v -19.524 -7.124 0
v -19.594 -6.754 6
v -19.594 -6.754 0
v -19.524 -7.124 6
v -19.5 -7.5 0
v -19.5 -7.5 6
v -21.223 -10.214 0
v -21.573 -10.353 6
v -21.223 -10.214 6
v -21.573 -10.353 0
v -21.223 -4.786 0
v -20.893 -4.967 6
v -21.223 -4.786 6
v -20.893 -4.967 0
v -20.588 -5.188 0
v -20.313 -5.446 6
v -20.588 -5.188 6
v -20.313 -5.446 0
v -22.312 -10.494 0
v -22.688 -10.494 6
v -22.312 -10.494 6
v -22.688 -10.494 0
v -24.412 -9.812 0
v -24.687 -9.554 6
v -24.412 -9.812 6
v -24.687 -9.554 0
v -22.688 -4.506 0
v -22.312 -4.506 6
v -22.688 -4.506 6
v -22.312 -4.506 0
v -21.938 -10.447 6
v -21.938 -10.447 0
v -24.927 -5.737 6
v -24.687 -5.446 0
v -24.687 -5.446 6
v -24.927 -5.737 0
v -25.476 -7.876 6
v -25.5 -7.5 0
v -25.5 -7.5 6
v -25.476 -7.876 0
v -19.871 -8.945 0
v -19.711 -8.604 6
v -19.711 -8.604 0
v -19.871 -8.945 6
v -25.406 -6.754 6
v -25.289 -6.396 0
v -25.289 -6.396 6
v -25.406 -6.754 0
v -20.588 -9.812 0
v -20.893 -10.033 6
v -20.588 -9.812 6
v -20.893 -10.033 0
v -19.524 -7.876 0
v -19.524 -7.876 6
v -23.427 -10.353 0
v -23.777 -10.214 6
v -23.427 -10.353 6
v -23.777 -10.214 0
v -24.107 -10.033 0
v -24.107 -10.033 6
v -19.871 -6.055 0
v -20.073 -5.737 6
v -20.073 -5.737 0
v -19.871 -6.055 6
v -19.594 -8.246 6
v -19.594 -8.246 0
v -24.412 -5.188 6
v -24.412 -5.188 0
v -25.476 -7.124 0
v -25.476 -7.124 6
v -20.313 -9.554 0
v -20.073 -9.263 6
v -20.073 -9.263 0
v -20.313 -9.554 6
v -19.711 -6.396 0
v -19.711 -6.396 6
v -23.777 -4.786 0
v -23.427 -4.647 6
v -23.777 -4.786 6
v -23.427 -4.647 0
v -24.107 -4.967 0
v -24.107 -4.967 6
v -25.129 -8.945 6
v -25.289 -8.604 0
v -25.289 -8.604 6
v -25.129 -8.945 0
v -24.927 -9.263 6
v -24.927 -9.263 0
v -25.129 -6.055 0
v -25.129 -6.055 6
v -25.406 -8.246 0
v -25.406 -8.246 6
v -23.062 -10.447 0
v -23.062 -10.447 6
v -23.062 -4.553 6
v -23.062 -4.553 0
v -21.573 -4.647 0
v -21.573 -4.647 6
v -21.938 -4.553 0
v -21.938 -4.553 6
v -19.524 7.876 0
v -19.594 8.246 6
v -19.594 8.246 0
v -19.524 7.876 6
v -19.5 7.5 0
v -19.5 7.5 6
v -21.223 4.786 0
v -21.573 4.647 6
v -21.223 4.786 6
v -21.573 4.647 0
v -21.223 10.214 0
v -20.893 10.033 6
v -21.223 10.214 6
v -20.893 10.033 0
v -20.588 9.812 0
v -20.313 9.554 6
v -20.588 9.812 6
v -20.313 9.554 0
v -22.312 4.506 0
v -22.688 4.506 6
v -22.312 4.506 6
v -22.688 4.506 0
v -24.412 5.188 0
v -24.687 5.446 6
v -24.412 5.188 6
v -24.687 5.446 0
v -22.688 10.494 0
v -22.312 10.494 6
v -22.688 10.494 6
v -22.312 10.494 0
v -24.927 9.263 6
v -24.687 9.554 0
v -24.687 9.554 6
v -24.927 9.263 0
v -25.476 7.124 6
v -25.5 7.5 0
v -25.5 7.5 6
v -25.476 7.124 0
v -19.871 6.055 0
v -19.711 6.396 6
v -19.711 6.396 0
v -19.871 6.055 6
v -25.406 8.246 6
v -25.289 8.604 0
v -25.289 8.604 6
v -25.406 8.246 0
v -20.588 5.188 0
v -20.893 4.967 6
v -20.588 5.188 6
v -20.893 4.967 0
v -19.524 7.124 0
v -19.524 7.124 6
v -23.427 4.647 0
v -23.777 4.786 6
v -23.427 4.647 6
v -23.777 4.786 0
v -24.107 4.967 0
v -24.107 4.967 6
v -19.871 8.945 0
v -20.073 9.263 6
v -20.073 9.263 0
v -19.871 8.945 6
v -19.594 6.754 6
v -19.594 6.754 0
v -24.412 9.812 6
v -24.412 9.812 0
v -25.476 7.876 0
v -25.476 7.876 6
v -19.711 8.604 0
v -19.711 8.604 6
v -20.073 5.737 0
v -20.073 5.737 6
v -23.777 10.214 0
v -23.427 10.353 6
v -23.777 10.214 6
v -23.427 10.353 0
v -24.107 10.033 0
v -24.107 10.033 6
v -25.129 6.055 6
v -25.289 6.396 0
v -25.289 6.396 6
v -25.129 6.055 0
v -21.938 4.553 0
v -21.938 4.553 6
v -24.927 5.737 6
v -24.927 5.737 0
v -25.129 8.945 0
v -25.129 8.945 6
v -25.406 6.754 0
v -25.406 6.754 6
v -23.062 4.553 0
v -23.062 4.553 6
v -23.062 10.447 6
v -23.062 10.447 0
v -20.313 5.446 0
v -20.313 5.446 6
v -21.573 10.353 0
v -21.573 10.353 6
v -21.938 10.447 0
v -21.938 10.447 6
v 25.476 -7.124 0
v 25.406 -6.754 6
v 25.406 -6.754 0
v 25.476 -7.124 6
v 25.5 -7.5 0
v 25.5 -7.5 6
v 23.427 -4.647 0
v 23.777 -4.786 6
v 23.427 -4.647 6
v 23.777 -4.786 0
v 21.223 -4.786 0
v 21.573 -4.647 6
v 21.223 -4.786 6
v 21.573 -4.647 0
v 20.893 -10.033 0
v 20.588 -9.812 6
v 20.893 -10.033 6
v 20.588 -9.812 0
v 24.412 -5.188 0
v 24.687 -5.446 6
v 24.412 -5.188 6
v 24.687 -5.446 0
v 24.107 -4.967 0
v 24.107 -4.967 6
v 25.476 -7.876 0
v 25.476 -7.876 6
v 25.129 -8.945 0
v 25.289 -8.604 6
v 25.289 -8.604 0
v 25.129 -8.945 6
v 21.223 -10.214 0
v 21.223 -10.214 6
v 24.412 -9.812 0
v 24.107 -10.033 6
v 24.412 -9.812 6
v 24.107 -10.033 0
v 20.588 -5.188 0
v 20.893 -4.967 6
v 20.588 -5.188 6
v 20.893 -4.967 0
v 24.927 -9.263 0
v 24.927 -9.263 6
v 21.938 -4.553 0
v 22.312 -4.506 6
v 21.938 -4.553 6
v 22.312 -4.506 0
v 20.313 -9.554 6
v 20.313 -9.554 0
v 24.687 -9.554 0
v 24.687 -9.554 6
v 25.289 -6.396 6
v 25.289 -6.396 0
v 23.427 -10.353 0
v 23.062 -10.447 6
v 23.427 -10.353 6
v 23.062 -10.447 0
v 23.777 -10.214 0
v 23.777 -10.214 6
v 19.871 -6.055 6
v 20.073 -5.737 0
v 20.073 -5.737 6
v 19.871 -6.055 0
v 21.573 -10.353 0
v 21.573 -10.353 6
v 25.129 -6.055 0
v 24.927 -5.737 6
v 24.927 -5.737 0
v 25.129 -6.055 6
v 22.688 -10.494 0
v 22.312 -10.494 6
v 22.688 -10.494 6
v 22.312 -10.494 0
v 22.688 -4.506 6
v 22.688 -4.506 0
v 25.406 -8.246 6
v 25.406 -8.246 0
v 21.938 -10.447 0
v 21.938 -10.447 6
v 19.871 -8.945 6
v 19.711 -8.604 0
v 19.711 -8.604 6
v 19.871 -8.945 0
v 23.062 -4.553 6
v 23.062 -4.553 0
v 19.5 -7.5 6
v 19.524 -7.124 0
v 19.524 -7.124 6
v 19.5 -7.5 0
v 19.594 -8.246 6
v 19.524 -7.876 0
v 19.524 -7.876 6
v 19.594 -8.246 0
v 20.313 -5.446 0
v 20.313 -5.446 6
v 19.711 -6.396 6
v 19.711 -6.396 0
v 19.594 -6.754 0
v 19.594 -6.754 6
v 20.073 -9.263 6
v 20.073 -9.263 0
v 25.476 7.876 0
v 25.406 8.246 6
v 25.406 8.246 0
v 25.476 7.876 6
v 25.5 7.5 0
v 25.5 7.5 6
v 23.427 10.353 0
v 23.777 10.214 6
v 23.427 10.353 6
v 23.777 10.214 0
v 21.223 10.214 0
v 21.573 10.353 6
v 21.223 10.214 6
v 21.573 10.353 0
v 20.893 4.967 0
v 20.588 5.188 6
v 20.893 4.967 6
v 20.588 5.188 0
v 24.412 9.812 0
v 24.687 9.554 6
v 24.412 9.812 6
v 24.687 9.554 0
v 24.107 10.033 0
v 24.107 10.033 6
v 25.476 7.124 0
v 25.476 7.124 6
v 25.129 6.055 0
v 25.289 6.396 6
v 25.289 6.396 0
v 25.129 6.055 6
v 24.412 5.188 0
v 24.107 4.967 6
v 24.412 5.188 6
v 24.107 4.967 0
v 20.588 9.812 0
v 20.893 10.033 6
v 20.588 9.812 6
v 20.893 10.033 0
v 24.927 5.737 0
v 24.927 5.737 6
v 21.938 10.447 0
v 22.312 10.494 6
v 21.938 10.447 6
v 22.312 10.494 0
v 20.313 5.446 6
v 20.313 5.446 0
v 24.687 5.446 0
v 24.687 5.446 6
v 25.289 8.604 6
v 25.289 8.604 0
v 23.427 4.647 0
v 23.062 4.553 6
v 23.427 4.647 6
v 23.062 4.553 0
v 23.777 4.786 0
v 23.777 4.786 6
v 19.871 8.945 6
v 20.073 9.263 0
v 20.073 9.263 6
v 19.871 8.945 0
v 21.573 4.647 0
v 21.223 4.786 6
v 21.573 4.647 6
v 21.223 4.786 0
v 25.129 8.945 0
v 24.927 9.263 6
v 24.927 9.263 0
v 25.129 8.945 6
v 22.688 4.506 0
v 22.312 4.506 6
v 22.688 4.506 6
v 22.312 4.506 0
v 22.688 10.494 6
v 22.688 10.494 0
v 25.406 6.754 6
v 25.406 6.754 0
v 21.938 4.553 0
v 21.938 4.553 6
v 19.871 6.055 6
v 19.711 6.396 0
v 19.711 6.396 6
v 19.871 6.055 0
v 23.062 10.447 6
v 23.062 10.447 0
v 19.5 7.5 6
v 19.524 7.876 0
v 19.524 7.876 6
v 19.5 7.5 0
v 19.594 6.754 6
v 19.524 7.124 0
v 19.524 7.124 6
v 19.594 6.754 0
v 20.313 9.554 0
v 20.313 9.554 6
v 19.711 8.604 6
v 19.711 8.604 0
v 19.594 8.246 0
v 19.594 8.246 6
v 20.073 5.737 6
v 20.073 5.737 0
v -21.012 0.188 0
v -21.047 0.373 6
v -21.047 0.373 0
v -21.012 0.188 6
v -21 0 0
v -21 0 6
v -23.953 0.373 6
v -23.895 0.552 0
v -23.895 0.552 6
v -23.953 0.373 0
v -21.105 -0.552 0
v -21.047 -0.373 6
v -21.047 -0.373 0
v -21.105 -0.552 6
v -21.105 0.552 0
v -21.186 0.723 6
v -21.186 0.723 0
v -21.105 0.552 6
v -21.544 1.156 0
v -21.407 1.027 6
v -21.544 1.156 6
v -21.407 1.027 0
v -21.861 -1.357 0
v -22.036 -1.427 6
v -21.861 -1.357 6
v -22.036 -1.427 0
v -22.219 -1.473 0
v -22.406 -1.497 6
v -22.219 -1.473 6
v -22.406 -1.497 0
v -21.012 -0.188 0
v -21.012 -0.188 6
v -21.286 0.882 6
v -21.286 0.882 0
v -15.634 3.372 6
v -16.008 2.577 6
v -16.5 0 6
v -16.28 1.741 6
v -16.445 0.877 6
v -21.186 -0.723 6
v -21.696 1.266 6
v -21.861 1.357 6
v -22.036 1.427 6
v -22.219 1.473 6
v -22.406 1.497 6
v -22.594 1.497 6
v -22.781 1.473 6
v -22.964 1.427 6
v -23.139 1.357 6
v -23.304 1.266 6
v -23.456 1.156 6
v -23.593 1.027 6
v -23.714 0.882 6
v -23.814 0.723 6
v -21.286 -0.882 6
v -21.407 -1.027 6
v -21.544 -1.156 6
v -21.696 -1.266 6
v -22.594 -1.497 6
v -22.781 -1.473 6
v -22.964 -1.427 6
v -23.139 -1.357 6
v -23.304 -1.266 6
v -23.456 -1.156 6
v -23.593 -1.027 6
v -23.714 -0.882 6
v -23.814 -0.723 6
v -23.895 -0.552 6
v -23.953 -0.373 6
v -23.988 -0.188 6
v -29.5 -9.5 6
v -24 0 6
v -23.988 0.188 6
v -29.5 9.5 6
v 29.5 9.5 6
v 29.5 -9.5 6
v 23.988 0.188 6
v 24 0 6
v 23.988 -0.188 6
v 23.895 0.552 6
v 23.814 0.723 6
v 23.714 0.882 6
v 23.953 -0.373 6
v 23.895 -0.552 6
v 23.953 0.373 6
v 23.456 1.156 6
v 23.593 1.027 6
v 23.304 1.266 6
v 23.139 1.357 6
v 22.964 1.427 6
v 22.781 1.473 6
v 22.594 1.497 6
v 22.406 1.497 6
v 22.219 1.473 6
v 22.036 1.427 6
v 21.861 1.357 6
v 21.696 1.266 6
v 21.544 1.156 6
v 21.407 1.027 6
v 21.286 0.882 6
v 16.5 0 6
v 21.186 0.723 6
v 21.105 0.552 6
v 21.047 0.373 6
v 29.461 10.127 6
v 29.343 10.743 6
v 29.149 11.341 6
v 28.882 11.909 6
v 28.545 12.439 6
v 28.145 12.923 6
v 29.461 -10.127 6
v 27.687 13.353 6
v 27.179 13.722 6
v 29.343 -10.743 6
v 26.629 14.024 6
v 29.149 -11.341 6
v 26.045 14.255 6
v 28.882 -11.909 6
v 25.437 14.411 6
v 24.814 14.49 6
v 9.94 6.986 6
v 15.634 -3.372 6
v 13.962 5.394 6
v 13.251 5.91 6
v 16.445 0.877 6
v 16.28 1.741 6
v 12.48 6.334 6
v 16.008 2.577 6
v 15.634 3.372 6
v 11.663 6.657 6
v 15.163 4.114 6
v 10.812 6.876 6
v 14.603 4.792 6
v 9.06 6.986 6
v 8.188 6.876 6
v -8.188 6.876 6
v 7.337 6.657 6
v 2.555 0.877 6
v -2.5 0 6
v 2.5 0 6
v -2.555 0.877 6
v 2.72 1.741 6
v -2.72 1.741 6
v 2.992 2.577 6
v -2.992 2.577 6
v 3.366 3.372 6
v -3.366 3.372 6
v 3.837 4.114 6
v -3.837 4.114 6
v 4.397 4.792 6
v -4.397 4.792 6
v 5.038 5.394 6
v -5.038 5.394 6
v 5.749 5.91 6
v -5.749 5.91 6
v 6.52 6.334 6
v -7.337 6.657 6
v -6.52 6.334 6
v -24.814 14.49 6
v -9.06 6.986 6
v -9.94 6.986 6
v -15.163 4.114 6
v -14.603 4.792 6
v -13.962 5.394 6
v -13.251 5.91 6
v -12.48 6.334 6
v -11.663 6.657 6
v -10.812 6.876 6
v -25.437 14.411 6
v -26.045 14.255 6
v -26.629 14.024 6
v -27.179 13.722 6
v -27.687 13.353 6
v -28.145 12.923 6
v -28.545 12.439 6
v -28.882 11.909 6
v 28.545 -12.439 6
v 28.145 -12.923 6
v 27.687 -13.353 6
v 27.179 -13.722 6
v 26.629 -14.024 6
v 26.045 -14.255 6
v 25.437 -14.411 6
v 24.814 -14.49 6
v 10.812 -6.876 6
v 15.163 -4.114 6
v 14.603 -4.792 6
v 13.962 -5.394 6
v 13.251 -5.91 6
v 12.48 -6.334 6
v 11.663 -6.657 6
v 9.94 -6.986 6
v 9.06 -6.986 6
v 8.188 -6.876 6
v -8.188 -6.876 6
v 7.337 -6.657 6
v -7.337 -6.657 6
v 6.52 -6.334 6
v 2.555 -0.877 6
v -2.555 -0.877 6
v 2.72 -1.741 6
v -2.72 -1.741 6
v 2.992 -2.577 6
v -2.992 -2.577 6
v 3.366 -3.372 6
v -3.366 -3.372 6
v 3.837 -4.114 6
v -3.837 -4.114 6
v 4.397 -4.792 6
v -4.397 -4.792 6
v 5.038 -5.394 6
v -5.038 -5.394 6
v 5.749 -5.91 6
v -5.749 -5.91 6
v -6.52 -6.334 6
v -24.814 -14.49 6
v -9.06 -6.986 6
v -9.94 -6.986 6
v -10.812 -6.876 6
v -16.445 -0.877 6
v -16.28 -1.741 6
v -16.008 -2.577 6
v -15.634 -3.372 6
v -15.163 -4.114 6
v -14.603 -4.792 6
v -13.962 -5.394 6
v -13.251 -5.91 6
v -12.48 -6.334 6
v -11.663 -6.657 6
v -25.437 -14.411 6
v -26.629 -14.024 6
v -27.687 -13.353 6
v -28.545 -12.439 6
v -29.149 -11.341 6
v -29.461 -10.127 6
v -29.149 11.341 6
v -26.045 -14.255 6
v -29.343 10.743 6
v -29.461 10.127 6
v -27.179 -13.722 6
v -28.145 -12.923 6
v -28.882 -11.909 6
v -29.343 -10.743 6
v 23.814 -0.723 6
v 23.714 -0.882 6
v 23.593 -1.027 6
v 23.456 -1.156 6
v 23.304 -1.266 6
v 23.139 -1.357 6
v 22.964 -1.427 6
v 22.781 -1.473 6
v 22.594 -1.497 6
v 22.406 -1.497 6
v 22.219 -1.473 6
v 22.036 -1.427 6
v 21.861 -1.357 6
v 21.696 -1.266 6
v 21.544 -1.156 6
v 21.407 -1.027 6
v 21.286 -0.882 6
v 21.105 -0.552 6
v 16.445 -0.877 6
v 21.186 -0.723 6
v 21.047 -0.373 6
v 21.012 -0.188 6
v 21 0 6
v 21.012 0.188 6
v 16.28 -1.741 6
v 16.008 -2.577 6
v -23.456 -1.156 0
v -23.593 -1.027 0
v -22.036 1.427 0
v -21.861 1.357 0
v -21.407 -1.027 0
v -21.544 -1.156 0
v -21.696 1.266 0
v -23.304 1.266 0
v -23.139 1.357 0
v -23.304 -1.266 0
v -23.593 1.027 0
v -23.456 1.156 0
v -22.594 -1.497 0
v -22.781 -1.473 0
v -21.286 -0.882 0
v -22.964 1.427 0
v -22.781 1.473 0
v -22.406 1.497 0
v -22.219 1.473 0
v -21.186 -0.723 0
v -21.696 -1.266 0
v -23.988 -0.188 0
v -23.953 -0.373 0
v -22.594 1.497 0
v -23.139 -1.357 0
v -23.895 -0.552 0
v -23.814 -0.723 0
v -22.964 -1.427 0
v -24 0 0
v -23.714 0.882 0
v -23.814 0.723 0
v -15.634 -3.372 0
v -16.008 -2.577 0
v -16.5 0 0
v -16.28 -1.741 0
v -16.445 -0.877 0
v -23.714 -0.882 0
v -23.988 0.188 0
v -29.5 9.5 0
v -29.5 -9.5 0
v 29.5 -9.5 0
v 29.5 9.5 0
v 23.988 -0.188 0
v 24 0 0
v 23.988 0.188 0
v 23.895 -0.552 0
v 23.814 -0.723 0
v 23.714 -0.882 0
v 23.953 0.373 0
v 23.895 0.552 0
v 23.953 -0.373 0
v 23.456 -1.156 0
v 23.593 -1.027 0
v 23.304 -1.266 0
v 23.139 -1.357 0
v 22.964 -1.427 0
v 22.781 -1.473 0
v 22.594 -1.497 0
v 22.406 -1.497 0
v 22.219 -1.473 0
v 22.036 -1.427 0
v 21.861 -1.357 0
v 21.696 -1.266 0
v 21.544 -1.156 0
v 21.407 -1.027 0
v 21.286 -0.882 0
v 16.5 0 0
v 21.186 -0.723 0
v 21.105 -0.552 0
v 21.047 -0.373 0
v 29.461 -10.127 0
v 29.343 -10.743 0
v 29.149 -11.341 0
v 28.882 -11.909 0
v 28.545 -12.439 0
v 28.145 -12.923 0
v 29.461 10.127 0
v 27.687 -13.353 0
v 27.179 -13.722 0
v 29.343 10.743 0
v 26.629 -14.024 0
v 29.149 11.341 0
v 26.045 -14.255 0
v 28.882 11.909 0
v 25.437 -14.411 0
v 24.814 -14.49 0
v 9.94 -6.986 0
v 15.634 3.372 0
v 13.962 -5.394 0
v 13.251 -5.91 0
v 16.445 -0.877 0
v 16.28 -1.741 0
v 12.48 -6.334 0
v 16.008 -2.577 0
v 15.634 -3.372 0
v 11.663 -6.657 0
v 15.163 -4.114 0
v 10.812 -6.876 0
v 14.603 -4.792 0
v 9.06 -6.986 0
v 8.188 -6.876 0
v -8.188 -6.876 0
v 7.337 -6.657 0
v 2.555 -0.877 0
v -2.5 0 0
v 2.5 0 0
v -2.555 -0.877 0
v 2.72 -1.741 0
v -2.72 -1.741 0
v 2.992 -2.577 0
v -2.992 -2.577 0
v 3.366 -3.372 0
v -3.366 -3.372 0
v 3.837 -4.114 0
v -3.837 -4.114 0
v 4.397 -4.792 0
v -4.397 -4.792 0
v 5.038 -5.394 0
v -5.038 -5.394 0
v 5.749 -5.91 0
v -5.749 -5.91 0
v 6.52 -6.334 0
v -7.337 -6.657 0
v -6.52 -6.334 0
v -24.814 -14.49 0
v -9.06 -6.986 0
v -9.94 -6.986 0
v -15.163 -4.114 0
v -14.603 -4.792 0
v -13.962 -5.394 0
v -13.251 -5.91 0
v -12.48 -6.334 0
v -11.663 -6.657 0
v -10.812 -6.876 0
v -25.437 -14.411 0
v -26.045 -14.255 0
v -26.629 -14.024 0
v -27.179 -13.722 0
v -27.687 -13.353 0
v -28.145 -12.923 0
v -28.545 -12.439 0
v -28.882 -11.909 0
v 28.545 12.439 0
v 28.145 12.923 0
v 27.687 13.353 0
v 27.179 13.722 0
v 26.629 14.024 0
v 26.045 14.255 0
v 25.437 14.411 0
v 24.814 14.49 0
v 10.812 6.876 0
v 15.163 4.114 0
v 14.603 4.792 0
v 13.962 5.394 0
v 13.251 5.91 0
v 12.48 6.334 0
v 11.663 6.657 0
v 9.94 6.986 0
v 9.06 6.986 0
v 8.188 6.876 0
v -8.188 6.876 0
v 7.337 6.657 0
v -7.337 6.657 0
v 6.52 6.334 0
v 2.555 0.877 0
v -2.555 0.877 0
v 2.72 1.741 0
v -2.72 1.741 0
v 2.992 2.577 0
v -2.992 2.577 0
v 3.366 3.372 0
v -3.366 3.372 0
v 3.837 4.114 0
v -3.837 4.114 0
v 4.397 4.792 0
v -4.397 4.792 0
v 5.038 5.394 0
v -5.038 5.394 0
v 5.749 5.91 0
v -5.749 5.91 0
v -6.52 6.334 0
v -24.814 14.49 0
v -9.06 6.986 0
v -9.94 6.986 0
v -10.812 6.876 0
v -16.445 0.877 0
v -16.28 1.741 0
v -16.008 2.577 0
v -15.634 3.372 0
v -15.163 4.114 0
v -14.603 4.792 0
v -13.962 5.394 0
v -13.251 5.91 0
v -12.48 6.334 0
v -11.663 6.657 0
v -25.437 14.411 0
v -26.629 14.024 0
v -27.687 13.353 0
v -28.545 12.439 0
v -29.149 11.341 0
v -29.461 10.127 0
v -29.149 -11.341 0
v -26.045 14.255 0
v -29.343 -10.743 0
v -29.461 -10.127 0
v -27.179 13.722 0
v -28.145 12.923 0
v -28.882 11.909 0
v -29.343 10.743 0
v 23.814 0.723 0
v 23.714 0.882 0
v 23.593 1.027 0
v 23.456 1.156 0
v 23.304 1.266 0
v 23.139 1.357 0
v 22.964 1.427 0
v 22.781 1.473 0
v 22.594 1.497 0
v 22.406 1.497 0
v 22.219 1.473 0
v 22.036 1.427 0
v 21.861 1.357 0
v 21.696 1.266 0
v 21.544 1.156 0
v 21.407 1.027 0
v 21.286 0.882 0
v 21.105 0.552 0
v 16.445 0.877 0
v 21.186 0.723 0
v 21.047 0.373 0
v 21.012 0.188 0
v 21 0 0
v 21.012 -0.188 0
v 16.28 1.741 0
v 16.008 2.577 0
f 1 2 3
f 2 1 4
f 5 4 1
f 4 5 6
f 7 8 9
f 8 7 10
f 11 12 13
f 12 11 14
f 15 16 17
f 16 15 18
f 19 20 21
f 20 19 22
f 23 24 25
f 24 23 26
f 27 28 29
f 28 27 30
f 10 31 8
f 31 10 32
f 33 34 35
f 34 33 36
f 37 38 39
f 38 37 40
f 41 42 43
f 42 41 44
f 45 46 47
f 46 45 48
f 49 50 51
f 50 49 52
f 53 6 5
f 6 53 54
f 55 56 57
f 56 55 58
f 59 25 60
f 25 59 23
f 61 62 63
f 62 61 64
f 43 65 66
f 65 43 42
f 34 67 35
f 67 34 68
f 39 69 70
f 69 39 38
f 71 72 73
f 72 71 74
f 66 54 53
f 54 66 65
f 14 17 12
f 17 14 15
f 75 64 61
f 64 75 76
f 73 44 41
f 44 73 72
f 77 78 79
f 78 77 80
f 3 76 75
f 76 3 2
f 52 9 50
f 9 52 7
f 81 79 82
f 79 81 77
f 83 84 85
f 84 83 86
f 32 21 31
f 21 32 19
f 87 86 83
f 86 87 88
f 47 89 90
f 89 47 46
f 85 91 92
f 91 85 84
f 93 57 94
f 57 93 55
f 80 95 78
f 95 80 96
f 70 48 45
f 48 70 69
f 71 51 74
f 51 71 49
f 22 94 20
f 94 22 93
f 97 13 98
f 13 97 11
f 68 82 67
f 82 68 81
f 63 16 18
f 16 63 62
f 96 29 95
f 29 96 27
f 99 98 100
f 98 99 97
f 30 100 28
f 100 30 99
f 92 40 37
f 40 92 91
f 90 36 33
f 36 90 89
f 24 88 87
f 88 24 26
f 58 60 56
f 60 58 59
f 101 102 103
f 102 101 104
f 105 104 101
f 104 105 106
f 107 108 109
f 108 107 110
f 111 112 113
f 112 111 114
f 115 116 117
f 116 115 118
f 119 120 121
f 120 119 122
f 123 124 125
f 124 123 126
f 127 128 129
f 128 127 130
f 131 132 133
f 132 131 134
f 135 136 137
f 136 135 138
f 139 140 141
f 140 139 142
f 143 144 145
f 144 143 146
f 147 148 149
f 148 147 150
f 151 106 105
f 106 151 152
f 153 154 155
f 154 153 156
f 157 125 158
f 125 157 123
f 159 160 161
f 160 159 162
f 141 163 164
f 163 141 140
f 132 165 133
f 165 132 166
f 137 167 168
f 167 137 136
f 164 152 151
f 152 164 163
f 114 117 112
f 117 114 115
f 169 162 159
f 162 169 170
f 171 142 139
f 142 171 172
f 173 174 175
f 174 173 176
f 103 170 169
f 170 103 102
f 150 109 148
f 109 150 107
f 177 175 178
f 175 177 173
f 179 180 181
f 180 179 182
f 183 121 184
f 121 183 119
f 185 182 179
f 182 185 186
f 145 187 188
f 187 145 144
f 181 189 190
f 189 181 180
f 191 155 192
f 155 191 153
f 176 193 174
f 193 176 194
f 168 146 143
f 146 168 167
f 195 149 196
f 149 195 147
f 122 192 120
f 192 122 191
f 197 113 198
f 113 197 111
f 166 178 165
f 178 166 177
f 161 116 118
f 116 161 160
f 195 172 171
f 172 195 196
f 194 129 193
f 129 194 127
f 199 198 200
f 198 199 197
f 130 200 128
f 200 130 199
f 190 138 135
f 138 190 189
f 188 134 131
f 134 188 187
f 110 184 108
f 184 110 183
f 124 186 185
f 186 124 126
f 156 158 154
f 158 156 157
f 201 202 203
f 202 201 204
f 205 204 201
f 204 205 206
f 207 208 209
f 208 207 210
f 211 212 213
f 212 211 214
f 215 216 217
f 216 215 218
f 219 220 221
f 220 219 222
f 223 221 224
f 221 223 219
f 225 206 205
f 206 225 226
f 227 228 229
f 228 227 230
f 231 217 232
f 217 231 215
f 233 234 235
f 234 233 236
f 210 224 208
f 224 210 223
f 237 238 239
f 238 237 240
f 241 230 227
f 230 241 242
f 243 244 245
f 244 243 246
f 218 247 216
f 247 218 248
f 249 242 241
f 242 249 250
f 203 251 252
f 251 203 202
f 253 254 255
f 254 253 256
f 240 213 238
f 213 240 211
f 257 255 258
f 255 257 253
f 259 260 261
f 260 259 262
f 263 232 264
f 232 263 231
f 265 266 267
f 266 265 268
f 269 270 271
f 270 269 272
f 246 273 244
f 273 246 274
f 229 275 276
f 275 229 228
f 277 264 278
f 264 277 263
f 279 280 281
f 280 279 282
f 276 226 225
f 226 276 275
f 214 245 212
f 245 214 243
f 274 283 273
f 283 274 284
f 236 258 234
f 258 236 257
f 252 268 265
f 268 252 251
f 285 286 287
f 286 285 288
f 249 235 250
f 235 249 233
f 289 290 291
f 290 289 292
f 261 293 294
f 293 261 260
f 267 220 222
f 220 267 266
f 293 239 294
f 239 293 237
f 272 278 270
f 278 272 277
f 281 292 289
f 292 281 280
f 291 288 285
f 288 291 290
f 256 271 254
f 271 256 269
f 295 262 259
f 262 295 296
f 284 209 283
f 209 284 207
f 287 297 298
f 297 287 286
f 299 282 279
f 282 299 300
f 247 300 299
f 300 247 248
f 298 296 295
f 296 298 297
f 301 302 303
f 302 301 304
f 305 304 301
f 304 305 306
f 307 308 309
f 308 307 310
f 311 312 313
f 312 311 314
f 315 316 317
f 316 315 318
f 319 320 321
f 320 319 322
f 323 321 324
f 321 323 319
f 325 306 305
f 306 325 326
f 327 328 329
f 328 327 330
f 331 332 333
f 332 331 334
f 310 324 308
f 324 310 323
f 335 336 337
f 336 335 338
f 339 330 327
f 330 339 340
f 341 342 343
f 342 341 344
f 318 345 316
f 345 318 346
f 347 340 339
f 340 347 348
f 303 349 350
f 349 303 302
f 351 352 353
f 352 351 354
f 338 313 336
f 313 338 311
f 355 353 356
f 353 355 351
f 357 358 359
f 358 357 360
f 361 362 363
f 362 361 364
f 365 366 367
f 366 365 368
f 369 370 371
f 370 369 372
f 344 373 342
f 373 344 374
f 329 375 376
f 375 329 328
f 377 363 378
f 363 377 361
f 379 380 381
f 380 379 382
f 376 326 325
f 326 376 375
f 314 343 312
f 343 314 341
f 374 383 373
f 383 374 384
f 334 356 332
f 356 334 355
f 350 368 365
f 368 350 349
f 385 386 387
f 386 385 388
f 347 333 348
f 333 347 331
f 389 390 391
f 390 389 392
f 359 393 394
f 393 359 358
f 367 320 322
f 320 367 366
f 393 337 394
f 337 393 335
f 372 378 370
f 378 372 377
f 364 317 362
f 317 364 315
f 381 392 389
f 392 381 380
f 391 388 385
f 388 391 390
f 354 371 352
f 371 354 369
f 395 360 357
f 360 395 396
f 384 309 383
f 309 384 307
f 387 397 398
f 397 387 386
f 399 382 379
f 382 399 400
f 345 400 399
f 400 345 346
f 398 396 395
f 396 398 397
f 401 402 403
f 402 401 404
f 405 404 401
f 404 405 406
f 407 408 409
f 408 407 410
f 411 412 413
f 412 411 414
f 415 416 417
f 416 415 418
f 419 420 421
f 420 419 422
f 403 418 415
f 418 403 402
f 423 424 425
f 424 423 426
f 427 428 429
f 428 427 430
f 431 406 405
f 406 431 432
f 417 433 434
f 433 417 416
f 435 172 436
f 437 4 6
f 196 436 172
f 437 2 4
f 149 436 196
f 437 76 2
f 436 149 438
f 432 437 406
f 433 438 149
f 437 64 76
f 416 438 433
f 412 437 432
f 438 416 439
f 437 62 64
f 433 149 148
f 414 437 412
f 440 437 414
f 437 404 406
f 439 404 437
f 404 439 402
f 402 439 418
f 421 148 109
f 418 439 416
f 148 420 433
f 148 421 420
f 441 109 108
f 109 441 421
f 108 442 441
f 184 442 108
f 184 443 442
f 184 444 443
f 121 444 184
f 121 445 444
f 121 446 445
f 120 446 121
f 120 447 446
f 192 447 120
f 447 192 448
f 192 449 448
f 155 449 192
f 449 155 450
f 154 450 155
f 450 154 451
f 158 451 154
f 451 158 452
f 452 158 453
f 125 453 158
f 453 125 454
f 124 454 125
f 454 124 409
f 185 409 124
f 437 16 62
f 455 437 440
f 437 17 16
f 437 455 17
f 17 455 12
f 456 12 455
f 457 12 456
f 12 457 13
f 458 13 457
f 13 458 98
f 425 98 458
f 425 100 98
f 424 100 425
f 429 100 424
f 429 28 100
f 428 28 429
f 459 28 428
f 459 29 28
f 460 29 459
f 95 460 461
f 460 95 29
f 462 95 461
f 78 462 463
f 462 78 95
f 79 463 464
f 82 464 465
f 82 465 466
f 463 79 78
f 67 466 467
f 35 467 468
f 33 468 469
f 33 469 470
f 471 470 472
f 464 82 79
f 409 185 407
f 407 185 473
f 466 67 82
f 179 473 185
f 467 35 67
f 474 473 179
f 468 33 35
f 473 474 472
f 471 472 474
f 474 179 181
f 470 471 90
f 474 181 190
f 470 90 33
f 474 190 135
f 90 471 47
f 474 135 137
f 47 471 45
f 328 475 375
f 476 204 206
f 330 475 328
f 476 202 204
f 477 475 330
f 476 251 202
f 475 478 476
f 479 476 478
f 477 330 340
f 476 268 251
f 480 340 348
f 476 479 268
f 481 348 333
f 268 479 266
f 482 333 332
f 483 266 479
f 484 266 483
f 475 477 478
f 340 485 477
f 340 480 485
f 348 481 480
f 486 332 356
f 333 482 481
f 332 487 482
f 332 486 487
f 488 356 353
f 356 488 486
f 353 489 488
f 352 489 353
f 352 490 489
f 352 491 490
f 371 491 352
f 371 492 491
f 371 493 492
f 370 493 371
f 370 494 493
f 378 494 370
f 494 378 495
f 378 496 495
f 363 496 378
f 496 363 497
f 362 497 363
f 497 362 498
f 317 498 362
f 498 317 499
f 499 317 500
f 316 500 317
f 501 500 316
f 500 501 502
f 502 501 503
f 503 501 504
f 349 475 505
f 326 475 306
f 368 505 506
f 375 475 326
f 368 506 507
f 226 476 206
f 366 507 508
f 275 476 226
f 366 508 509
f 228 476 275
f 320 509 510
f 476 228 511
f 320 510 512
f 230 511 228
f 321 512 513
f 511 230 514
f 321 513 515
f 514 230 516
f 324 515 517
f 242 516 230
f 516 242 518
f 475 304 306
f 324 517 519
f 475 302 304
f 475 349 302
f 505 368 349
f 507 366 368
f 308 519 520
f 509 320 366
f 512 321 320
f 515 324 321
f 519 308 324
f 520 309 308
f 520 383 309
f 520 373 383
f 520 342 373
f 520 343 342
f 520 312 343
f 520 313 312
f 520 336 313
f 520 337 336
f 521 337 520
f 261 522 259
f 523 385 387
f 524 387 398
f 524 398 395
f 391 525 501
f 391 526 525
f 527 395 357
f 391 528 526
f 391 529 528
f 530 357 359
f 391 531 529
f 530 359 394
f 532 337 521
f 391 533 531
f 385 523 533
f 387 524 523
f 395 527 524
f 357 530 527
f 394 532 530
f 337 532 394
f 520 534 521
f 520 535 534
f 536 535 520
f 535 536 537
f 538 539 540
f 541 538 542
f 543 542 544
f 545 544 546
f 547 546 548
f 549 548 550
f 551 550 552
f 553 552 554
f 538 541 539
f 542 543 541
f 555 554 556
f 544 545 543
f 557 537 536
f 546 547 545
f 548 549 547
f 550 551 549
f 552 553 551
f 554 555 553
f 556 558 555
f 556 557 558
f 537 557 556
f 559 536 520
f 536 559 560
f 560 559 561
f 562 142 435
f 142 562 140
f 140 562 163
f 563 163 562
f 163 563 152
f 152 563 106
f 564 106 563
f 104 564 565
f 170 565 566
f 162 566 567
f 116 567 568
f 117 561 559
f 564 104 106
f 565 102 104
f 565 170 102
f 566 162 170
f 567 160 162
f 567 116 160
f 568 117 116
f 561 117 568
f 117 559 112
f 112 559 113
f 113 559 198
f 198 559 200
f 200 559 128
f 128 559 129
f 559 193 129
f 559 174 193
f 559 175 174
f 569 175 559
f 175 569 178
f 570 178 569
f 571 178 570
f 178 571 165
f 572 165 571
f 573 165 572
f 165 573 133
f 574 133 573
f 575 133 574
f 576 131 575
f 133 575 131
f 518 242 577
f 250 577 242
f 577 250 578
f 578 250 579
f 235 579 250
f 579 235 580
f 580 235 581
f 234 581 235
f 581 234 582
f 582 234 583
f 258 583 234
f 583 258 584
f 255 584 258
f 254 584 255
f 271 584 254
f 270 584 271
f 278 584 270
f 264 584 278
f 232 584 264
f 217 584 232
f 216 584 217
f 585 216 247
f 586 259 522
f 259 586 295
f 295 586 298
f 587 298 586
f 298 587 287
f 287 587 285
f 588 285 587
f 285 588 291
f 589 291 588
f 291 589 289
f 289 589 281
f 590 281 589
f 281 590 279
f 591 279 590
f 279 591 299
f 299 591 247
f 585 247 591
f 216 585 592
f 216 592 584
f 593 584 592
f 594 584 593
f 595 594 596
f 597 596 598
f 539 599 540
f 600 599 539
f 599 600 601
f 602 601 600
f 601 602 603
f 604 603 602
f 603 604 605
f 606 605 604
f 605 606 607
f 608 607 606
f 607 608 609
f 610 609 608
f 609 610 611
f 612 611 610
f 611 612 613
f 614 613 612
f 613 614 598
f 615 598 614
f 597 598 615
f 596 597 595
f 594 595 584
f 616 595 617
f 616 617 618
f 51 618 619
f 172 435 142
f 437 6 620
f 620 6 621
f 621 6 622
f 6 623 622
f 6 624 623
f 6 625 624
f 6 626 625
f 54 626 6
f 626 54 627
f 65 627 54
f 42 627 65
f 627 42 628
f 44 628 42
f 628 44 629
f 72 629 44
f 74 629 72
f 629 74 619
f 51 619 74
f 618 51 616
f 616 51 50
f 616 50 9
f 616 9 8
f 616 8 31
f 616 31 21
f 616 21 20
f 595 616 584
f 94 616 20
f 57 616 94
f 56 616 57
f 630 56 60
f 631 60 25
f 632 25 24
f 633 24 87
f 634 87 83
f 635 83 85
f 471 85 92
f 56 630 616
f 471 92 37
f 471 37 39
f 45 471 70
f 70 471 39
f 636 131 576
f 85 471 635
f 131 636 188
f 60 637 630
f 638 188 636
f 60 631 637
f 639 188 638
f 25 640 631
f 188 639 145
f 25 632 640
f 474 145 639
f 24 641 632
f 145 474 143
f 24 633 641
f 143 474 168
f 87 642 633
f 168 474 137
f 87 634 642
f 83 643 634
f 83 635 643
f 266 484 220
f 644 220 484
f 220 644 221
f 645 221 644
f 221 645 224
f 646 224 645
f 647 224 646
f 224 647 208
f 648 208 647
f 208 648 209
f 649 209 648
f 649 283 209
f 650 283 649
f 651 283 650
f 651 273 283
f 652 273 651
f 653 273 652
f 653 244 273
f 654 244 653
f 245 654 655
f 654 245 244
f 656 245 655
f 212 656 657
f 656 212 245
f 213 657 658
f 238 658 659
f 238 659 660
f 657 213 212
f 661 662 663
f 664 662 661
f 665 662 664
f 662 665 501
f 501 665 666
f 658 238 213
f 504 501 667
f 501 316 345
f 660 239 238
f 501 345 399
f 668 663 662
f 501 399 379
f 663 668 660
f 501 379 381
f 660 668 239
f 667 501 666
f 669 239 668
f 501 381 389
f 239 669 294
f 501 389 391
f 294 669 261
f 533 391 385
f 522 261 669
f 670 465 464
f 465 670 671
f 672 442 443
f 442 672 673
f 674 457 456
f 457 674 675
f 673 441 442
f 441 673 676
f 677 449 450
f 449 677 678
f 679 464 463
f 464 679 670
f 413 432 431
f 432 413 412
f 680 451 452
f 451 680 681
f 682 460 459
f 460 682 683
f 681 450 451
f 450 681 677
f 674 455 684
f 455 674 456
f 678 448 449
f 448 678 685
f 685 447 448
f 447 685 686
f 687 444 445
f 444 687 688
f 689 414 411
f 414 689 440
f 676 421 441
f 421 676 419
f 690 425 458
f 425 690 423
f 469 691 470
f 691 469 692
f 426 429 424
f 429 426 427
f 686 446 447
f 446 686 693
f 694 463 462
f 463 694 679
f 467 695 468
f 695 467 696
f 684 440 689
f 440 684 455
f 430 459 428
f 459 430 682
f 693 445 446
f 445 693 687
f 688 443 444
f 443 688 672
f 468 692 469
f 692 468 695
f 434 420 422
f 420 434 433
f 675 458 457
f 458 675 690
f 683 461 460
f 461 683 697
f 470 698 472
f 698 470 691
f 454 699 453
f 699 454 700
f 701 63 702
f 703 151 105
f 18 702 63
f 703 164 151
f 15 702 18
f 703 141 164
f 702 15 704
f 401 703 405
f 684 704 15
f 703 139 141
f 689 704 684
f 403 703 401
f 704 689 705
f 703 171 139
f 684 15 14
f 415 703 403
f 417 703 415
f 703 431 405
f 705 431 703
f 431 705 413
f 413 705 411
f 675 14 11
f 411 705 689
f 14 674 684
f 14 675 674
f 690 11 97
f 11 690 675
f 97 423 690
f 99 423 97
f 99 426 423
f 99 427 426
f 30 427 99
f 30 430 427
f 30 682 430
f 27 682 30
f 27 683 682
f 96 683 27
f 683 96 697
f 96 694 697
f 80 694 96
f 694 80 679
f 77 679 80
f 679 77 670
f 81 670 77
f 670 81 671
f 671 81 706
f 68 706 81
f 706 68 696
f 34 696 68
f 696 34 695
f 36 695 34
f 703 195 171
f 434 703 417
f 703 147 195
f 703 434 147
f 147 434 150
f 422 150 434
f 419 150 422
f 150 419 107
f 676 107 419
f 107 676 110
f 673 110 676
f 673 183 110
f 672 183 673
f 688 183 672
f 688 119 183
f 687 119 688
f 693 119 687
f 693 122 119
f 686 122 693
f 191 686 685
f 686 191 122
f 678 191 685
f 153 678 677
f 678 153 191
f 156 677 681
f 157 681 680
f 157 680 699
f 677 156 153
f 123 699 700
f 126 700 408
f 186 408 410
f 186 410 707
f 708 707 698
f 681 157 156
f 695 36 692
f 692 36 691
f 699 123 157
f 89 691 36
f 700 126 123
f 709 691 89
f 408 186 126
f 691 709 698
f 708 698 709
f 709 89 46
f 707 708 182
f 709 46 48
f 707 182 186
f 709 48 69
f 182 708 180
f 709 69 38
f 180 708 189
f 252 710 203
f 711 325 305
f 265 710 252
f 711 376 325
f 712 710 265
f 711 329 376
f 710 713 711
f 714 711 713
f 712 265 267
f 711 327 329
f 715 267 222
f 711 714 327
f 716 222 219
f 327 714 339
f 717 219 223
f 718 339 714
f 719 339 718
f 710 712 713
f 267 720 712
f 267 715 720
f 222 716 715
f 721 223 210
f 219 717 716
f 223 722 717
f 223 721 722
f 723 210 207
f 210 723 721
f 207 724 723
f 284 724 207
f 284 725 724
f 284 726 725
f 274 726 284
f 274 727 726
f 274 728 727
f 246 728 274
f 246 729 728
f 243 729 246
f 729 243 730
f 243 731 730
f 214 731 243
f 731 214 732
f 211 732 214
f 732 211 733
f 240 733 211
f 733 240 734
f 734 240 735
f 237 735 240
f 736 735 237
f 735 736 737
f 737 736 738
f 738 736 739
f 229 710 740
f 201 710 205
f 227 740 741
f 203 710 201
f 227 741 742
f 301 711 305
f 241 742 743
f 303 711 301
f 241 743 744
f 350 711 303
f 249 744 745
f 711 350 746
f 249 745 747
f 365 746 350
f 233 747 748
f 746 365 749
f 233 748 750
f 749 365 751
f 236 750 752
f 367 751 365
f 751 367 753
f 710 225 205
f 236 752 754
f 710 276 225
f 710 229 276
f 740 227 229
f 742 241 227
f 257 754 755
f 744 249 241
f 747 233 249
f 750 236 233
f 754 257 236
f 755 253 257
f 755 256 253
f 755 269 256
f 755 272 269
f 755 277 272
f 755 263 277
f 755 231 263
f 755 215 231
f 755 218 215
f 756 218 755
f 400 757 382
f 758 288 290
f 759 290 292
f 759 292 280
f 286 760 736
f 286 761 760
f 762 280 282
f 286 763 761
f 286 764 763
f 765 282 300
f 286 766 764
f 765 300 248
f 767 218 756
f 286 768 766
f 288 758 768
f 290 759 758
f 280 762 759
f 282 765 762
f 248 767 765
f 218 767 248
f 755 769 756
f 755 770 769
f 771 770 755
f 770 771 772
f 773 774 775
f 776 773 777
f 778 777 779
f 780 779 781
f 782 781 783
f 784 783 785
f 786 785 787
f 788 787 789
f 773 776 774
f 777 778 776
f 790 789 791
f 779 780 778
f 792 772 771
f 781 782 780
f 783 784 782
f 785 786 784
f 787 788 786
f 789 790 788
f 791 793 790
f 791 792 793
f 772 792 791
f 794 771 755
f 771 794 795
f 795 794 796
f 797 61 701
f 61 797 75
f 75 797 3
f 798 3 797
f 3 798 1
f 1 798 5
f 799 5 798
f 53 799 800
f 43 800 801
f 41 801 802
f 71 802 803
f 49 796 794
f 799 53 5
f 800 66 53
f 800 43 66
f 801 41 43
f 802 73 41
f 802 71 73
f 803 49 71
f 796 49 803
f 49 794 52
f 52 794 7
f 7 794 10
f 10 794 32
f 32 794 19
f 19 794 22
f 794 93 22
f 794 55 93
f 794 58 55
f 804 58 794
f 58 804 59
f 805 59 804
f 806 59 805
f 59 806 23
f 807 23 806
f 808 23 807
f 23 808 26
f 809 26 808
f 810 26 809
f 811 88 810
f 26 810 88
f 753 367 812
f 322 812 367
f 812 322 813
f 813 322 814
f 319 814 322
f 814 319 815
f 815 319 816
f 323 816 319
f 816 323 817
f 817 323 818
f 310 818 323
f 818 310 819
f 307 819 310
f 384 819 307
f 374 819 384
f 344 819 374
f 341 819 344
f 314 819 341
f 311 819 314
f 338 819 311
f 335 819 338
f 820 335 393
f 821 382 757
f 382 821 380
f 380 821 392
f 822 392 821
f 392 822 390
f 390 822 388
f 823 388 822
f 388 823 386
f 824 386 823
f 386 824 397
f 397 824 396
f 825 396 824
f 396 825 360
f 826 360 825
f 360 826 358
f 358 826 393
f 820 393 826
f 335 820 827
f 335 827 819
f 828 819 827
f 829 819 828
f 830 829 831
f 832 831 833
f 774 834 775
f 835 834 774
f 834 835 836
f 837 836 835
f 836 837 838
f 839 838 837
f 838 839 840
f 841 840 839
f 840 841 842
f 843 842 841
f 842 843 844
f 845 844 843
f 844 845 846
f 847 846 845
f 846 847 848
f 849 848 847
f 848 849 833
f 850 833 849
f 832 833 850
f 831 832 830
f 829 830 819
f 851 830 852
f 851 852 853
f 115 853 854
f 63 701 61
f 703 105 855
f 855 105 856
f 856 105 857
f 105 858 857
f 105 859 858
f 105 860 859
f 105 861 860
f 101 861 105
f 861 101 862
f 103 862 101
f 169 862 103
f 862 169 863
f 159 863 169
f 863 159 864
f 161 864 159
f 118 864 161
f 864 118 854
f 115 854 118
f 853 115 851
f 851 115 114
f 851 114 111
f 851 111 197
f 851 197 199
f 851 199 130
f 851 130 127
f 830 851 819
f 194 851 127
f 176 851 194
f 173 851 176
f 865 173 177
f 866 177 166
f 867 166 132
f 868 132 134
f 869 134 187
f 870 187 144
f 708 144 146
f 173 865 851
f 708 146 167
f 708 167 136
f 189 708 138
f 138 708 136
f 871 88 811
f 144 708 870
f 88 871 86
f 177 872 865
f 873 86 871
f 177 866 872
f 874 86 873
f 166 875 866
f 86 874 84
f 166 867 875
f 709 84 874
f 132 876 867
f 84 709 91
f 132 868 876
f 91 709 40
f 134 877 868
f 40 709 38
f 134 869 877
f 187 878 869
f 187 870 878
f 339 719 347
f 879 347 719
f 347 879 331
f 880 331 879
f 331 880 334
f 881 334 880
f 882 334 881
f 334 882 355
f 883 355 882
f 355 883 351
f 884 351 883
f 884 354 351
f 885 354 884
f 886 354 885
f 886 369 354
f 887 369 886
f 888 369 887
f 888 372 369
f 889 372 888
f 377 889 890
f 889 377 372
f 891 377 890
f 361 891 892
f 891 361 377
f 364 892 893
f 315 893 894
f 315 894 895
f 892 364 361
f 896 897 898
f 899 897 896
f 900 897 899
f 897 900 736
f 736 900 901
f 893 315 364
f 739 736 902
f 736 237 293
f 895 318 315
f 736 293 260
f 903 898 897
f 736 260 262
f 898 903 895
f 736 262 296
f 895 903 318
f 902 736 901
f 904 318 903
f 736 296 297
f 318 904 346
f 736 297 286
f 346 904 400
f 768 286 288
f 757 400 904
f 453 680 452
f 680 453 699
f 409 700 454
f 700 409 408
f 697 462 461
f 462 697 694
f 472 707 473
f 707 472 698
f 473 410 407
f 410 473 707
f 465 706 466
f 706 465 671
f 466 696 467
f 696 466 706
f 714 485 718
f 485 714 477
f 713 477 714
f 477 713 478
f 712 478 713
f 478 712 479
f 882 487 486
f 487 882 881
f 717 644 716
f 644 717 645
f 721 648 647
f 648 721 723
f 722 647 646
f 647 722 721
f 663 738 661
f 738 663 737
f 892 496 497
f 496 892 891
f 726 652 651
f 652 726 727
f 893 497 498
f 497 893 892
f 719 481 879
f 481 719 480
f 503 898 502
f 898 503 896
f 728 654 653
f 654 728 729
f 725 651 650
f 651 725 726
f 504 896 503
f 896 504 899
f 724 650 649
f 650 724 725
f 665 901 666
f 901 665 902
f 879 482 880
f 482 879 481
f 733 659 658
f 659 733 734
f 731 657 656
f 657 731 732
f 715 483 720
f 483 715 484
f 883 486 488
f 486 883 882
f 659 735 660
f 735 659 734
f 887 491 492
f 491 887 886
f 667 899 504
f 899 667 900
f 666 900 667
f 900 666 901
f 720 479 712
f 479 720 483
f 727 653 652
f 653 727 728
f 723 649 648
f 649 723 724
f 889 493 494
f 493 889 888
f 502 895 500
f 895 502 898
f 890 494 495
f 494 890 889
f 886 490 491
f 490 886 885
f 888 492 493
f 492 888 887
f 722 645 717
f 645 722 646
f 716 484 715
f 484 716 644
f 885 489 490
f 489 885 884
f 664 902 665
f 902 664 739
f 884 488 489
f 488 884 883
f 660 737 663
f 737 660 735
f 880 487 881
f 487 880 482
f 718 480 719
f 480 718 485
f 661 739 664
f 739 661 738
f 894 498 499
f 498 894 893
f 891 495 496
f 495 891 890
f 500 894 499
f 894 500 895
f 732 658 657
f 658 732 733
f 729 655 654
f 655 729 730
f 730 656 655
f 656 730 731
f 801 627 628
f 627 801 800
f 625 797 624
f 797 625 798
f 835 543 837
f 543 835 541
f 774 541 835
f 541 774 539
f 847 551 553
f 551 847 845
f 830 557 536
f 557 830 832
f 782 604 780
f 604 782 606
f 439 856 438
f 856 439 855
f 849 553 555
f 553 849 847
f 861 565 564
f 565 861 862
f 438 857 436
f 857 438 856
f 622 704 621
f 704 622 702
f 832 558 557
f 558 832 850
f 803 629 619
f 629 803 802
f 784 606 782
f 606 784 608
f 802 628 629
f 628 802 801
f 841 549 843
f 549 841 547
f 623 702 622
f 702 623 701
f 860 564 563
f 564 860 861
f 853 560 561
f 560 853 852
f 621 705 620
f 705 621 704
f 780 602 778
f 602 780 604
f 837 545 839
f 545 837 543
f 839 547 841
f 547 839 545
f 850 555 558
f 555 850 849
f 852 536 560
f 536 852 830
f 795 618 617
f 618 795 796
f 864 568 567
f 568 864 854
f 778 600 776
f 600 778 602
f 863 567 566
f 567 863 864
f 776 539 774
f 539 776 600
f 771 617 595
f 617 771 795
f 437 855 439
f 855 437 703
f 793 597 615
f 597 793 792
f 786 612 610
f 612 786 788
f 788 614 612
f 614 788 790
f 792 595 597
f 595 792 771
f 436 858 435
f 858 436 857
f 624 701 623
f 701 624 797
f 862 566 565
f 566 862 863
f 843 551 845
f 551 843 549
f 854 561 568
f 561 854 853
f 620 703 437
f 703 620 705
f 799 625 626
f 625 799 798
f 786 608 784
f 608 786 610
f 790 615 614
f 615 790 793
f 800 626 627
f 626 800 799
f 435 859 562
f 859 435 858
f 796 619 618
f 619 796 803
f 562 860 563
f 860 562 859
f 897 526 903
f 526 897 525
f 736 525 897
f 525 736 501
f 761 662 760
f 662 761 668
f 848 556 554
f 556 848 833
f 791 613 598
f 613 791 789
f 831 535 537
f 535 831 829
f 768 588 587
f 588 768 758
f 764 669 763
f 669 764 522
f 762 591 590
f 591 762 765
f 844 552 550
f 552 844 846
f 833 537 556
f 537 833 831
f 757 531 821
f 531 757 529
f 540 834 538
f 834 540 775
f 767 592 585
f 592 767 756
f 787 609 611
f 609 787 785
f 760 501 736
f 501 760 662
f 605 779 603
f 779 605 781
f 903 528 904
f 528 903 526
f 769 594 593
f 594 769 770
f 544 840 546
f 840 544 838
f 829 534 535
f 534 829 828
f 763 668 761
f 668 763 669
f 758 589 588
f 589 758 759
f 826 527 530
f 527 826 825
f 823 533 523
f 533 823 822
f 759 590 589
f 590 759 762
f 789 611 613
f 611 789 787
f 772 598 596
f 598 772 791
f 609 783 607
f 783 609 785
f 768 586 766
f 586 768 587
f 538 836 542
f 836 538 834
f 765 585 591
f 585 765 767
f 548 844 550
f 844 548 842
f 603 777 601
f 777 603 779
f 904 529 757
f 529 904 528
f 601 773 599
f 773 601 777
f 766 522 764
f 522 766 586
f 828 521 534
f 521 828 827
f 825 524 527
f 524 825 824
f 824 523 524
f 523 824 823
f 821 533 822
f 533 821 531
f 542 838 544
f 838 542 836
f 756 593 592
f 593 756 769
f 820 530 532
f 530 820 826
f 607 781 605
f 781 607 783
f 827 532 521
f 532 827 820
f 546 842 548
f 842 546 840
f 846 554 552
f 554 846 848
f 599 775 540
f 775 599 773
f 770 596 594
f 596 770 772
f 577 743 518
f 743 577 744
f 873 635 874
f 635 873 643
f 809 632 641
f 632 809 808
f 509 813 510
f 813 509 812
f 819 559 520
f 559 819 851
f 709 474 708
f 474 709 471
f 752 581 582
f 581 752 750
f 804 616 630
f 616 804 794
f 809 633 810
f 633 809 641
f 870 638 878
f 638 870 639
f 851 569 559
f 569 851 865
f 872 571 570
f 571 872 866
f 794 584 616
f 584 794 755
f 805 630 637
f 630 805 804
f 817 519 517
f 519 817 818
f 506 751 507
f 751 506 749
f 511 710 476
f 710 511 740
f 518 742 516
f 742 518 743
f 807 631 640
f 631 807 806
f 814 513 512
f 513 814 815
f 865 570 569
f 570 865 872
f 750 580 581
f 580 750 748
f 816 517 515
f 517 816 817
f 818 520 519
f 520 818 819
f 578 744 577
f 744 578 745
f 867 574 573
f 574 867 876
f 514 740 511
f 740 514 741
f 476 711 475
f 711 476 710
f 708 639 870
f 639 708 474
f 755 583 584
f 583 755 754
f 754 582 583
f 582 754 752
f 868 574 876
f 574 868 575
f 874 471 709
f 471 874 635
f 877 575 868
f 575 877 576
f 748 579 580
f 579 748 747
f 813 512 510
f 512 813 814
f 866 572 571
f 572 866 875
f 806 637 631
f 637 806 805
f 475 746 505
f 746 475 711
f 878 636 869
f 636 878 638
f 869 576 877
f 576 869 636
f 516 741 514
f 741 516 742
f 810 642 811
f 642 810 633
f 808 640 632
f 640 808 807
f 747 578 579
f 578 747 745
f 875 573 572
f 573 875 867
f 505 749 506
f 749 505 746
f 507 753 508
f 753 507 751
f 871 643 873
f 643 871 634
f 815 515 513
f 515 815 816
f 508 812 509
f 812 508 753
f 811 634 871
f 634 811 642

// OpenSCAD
$fn = 50;


difference() {
	union() {
		hull() {
			translate(v = [-24.5000000000, 9.5000000000, 0]) {
				cylinder(h = 6, r = 5);
			}
			translate(v = [24.5000000000, 9.5000000000, 0]) {
				cylinder(h = 6, r = 5);
			}
			translate(v = [-24.5000000000, -9.5000000000, 0]) {
				cylinder(h = 6, r = 5);
			}
			translate(v = [24.5000000000, -9.5000000000, 0]) {
				cylinder(h = 6, r = 5);
			}
		}
	}
	union() {
		#translate(v = [-22.5000000000, -7.5000000000, 0]) {
			cylinder(h = 6, r = 3.0000000000);
		}
		#translate(v = [-22.5000000000, 7.5000000000, 0]) {
			cylinder(h = 6, r = 3.0000000000);
		}
		#translate(v = [22.5000000000, -7.5000000000, 0]) {
			cylinder(h = 6, r = 3.0000000000);
		}
		#translate(v = [22.5000000000, 7.5000000000, 0]) {
			cylinder(h = 6, r = 3.0000000000);
		}
		#translate(v = [-22.5000000000, -7.5000000000, -100.0000000000]) {
			cylinder(h = 200, r = 3.0000000000);
		}
		#translate(v = [-22.5000000000, 7.5000000000, -100.0000000000]) {
			cylinder(h = 200, r = 3.0000000000);
		}
		#translate(v = [22.5000000000, -7.5000000000, -100.0000000000]) {
			cylinder(h = 200, r = 3.0000000000);
		}
		#translate(v = [22.5000000000, 7.5000000000, -100.0000000000]) {
			cylinder(h = 200, r = 3.0000000000);
		}
		#translate(v = [-22.5000000000, -7.5000000000, 0]) {
			cylinder(h = 6, r = 1.5000000000);
		}
		#translate(v = [-22.5000000000, 0.0000000000, 0]) {
			cylinder(h = 6, r = 1.5000000000);
		}
		#translate(v = [-22.5000000000, 7.5000000000, 0]) {
			cylinder(h = 6, r = 1.5000000000);
		}
		#translate(v = [22.5000000000, -7.5000000000, 0]) {
			cylinder(h = 6, r = 1.5000000000);
		}
		#translate(v = [22.5000000000, 0.0000000000, 0]) {
			cylinder(h = 6, r = 1.5000000000);
		}
		#translate(v = [22.5000000000, 7.5000000000, 0]) {
			cylinder(h = 6, r = 1.5000000000);
		}
		#translate(v = [-22.5000000000, -7.5000000000, 0]) {
			cylinder(h = 6, r = 1.5000000000);
		}
		#translate(v = [-22.5000000000, 0.0000000000, 0]) {
			cylinder(h = 6, r = 1.5000000000);
		}
		#translate(v = [-22.5000000000, 7.5000000000, 0]) {
			cylinder(h = 6, r = 1.5000000000);
		}
		#translate(v = [22.5000000000, -7.5000000000, 0]) {
			cylinder(h = 6, r = 1.5000000000);
		}
		#translate(v = [22.5000000000, 0.0000000000, 0]) {
			cylinder(h = 6, r = 1.5000000000);
		}
		#translate(v = [22.5000000000, 7.5000000000, 0]) {
			cylinder(h = 6, r = 1.5000000000);
		}
		#translate(v = [-22.5000000000, -7.5000000000, 0]) {
			cylinder(h = 6, r = 1.5000000000);
		}
		#translate(v = [-22.5000000000, 0.0000000000, 0]) {
			cylinder(h = 6, r = 1.5000000000);
		}
		#translate(v = [-22.5000000000, 7.5000000000, 0]) {
			cylinder(h = 6, r = 1.5000000000);
		}
		#translate(v = [22.5000000000, -7.5000000000, 0]) {
			cylinder(h = 6, r = 1.5000000000);
		}
		#translate(v = [22.5000000000, 0.0000000000, 0]) {
			cylinder(h = 6, r = 1.5000000000);
		}
		#translate(v = [22.5000000000, 7.5000000000, 0]) {
			cylinder(h = 6, r = 1.5000000000);
		}
		#translate(v = [-9.5000000000, 0, 0]) {
			cylinder(h = 6, r = 7.0000000000);
		}
		#translate(v = [9.5000000000, 0, 0]) {
			cylinder(h = 6, r = 7.0000000000);
		}
	}
}
